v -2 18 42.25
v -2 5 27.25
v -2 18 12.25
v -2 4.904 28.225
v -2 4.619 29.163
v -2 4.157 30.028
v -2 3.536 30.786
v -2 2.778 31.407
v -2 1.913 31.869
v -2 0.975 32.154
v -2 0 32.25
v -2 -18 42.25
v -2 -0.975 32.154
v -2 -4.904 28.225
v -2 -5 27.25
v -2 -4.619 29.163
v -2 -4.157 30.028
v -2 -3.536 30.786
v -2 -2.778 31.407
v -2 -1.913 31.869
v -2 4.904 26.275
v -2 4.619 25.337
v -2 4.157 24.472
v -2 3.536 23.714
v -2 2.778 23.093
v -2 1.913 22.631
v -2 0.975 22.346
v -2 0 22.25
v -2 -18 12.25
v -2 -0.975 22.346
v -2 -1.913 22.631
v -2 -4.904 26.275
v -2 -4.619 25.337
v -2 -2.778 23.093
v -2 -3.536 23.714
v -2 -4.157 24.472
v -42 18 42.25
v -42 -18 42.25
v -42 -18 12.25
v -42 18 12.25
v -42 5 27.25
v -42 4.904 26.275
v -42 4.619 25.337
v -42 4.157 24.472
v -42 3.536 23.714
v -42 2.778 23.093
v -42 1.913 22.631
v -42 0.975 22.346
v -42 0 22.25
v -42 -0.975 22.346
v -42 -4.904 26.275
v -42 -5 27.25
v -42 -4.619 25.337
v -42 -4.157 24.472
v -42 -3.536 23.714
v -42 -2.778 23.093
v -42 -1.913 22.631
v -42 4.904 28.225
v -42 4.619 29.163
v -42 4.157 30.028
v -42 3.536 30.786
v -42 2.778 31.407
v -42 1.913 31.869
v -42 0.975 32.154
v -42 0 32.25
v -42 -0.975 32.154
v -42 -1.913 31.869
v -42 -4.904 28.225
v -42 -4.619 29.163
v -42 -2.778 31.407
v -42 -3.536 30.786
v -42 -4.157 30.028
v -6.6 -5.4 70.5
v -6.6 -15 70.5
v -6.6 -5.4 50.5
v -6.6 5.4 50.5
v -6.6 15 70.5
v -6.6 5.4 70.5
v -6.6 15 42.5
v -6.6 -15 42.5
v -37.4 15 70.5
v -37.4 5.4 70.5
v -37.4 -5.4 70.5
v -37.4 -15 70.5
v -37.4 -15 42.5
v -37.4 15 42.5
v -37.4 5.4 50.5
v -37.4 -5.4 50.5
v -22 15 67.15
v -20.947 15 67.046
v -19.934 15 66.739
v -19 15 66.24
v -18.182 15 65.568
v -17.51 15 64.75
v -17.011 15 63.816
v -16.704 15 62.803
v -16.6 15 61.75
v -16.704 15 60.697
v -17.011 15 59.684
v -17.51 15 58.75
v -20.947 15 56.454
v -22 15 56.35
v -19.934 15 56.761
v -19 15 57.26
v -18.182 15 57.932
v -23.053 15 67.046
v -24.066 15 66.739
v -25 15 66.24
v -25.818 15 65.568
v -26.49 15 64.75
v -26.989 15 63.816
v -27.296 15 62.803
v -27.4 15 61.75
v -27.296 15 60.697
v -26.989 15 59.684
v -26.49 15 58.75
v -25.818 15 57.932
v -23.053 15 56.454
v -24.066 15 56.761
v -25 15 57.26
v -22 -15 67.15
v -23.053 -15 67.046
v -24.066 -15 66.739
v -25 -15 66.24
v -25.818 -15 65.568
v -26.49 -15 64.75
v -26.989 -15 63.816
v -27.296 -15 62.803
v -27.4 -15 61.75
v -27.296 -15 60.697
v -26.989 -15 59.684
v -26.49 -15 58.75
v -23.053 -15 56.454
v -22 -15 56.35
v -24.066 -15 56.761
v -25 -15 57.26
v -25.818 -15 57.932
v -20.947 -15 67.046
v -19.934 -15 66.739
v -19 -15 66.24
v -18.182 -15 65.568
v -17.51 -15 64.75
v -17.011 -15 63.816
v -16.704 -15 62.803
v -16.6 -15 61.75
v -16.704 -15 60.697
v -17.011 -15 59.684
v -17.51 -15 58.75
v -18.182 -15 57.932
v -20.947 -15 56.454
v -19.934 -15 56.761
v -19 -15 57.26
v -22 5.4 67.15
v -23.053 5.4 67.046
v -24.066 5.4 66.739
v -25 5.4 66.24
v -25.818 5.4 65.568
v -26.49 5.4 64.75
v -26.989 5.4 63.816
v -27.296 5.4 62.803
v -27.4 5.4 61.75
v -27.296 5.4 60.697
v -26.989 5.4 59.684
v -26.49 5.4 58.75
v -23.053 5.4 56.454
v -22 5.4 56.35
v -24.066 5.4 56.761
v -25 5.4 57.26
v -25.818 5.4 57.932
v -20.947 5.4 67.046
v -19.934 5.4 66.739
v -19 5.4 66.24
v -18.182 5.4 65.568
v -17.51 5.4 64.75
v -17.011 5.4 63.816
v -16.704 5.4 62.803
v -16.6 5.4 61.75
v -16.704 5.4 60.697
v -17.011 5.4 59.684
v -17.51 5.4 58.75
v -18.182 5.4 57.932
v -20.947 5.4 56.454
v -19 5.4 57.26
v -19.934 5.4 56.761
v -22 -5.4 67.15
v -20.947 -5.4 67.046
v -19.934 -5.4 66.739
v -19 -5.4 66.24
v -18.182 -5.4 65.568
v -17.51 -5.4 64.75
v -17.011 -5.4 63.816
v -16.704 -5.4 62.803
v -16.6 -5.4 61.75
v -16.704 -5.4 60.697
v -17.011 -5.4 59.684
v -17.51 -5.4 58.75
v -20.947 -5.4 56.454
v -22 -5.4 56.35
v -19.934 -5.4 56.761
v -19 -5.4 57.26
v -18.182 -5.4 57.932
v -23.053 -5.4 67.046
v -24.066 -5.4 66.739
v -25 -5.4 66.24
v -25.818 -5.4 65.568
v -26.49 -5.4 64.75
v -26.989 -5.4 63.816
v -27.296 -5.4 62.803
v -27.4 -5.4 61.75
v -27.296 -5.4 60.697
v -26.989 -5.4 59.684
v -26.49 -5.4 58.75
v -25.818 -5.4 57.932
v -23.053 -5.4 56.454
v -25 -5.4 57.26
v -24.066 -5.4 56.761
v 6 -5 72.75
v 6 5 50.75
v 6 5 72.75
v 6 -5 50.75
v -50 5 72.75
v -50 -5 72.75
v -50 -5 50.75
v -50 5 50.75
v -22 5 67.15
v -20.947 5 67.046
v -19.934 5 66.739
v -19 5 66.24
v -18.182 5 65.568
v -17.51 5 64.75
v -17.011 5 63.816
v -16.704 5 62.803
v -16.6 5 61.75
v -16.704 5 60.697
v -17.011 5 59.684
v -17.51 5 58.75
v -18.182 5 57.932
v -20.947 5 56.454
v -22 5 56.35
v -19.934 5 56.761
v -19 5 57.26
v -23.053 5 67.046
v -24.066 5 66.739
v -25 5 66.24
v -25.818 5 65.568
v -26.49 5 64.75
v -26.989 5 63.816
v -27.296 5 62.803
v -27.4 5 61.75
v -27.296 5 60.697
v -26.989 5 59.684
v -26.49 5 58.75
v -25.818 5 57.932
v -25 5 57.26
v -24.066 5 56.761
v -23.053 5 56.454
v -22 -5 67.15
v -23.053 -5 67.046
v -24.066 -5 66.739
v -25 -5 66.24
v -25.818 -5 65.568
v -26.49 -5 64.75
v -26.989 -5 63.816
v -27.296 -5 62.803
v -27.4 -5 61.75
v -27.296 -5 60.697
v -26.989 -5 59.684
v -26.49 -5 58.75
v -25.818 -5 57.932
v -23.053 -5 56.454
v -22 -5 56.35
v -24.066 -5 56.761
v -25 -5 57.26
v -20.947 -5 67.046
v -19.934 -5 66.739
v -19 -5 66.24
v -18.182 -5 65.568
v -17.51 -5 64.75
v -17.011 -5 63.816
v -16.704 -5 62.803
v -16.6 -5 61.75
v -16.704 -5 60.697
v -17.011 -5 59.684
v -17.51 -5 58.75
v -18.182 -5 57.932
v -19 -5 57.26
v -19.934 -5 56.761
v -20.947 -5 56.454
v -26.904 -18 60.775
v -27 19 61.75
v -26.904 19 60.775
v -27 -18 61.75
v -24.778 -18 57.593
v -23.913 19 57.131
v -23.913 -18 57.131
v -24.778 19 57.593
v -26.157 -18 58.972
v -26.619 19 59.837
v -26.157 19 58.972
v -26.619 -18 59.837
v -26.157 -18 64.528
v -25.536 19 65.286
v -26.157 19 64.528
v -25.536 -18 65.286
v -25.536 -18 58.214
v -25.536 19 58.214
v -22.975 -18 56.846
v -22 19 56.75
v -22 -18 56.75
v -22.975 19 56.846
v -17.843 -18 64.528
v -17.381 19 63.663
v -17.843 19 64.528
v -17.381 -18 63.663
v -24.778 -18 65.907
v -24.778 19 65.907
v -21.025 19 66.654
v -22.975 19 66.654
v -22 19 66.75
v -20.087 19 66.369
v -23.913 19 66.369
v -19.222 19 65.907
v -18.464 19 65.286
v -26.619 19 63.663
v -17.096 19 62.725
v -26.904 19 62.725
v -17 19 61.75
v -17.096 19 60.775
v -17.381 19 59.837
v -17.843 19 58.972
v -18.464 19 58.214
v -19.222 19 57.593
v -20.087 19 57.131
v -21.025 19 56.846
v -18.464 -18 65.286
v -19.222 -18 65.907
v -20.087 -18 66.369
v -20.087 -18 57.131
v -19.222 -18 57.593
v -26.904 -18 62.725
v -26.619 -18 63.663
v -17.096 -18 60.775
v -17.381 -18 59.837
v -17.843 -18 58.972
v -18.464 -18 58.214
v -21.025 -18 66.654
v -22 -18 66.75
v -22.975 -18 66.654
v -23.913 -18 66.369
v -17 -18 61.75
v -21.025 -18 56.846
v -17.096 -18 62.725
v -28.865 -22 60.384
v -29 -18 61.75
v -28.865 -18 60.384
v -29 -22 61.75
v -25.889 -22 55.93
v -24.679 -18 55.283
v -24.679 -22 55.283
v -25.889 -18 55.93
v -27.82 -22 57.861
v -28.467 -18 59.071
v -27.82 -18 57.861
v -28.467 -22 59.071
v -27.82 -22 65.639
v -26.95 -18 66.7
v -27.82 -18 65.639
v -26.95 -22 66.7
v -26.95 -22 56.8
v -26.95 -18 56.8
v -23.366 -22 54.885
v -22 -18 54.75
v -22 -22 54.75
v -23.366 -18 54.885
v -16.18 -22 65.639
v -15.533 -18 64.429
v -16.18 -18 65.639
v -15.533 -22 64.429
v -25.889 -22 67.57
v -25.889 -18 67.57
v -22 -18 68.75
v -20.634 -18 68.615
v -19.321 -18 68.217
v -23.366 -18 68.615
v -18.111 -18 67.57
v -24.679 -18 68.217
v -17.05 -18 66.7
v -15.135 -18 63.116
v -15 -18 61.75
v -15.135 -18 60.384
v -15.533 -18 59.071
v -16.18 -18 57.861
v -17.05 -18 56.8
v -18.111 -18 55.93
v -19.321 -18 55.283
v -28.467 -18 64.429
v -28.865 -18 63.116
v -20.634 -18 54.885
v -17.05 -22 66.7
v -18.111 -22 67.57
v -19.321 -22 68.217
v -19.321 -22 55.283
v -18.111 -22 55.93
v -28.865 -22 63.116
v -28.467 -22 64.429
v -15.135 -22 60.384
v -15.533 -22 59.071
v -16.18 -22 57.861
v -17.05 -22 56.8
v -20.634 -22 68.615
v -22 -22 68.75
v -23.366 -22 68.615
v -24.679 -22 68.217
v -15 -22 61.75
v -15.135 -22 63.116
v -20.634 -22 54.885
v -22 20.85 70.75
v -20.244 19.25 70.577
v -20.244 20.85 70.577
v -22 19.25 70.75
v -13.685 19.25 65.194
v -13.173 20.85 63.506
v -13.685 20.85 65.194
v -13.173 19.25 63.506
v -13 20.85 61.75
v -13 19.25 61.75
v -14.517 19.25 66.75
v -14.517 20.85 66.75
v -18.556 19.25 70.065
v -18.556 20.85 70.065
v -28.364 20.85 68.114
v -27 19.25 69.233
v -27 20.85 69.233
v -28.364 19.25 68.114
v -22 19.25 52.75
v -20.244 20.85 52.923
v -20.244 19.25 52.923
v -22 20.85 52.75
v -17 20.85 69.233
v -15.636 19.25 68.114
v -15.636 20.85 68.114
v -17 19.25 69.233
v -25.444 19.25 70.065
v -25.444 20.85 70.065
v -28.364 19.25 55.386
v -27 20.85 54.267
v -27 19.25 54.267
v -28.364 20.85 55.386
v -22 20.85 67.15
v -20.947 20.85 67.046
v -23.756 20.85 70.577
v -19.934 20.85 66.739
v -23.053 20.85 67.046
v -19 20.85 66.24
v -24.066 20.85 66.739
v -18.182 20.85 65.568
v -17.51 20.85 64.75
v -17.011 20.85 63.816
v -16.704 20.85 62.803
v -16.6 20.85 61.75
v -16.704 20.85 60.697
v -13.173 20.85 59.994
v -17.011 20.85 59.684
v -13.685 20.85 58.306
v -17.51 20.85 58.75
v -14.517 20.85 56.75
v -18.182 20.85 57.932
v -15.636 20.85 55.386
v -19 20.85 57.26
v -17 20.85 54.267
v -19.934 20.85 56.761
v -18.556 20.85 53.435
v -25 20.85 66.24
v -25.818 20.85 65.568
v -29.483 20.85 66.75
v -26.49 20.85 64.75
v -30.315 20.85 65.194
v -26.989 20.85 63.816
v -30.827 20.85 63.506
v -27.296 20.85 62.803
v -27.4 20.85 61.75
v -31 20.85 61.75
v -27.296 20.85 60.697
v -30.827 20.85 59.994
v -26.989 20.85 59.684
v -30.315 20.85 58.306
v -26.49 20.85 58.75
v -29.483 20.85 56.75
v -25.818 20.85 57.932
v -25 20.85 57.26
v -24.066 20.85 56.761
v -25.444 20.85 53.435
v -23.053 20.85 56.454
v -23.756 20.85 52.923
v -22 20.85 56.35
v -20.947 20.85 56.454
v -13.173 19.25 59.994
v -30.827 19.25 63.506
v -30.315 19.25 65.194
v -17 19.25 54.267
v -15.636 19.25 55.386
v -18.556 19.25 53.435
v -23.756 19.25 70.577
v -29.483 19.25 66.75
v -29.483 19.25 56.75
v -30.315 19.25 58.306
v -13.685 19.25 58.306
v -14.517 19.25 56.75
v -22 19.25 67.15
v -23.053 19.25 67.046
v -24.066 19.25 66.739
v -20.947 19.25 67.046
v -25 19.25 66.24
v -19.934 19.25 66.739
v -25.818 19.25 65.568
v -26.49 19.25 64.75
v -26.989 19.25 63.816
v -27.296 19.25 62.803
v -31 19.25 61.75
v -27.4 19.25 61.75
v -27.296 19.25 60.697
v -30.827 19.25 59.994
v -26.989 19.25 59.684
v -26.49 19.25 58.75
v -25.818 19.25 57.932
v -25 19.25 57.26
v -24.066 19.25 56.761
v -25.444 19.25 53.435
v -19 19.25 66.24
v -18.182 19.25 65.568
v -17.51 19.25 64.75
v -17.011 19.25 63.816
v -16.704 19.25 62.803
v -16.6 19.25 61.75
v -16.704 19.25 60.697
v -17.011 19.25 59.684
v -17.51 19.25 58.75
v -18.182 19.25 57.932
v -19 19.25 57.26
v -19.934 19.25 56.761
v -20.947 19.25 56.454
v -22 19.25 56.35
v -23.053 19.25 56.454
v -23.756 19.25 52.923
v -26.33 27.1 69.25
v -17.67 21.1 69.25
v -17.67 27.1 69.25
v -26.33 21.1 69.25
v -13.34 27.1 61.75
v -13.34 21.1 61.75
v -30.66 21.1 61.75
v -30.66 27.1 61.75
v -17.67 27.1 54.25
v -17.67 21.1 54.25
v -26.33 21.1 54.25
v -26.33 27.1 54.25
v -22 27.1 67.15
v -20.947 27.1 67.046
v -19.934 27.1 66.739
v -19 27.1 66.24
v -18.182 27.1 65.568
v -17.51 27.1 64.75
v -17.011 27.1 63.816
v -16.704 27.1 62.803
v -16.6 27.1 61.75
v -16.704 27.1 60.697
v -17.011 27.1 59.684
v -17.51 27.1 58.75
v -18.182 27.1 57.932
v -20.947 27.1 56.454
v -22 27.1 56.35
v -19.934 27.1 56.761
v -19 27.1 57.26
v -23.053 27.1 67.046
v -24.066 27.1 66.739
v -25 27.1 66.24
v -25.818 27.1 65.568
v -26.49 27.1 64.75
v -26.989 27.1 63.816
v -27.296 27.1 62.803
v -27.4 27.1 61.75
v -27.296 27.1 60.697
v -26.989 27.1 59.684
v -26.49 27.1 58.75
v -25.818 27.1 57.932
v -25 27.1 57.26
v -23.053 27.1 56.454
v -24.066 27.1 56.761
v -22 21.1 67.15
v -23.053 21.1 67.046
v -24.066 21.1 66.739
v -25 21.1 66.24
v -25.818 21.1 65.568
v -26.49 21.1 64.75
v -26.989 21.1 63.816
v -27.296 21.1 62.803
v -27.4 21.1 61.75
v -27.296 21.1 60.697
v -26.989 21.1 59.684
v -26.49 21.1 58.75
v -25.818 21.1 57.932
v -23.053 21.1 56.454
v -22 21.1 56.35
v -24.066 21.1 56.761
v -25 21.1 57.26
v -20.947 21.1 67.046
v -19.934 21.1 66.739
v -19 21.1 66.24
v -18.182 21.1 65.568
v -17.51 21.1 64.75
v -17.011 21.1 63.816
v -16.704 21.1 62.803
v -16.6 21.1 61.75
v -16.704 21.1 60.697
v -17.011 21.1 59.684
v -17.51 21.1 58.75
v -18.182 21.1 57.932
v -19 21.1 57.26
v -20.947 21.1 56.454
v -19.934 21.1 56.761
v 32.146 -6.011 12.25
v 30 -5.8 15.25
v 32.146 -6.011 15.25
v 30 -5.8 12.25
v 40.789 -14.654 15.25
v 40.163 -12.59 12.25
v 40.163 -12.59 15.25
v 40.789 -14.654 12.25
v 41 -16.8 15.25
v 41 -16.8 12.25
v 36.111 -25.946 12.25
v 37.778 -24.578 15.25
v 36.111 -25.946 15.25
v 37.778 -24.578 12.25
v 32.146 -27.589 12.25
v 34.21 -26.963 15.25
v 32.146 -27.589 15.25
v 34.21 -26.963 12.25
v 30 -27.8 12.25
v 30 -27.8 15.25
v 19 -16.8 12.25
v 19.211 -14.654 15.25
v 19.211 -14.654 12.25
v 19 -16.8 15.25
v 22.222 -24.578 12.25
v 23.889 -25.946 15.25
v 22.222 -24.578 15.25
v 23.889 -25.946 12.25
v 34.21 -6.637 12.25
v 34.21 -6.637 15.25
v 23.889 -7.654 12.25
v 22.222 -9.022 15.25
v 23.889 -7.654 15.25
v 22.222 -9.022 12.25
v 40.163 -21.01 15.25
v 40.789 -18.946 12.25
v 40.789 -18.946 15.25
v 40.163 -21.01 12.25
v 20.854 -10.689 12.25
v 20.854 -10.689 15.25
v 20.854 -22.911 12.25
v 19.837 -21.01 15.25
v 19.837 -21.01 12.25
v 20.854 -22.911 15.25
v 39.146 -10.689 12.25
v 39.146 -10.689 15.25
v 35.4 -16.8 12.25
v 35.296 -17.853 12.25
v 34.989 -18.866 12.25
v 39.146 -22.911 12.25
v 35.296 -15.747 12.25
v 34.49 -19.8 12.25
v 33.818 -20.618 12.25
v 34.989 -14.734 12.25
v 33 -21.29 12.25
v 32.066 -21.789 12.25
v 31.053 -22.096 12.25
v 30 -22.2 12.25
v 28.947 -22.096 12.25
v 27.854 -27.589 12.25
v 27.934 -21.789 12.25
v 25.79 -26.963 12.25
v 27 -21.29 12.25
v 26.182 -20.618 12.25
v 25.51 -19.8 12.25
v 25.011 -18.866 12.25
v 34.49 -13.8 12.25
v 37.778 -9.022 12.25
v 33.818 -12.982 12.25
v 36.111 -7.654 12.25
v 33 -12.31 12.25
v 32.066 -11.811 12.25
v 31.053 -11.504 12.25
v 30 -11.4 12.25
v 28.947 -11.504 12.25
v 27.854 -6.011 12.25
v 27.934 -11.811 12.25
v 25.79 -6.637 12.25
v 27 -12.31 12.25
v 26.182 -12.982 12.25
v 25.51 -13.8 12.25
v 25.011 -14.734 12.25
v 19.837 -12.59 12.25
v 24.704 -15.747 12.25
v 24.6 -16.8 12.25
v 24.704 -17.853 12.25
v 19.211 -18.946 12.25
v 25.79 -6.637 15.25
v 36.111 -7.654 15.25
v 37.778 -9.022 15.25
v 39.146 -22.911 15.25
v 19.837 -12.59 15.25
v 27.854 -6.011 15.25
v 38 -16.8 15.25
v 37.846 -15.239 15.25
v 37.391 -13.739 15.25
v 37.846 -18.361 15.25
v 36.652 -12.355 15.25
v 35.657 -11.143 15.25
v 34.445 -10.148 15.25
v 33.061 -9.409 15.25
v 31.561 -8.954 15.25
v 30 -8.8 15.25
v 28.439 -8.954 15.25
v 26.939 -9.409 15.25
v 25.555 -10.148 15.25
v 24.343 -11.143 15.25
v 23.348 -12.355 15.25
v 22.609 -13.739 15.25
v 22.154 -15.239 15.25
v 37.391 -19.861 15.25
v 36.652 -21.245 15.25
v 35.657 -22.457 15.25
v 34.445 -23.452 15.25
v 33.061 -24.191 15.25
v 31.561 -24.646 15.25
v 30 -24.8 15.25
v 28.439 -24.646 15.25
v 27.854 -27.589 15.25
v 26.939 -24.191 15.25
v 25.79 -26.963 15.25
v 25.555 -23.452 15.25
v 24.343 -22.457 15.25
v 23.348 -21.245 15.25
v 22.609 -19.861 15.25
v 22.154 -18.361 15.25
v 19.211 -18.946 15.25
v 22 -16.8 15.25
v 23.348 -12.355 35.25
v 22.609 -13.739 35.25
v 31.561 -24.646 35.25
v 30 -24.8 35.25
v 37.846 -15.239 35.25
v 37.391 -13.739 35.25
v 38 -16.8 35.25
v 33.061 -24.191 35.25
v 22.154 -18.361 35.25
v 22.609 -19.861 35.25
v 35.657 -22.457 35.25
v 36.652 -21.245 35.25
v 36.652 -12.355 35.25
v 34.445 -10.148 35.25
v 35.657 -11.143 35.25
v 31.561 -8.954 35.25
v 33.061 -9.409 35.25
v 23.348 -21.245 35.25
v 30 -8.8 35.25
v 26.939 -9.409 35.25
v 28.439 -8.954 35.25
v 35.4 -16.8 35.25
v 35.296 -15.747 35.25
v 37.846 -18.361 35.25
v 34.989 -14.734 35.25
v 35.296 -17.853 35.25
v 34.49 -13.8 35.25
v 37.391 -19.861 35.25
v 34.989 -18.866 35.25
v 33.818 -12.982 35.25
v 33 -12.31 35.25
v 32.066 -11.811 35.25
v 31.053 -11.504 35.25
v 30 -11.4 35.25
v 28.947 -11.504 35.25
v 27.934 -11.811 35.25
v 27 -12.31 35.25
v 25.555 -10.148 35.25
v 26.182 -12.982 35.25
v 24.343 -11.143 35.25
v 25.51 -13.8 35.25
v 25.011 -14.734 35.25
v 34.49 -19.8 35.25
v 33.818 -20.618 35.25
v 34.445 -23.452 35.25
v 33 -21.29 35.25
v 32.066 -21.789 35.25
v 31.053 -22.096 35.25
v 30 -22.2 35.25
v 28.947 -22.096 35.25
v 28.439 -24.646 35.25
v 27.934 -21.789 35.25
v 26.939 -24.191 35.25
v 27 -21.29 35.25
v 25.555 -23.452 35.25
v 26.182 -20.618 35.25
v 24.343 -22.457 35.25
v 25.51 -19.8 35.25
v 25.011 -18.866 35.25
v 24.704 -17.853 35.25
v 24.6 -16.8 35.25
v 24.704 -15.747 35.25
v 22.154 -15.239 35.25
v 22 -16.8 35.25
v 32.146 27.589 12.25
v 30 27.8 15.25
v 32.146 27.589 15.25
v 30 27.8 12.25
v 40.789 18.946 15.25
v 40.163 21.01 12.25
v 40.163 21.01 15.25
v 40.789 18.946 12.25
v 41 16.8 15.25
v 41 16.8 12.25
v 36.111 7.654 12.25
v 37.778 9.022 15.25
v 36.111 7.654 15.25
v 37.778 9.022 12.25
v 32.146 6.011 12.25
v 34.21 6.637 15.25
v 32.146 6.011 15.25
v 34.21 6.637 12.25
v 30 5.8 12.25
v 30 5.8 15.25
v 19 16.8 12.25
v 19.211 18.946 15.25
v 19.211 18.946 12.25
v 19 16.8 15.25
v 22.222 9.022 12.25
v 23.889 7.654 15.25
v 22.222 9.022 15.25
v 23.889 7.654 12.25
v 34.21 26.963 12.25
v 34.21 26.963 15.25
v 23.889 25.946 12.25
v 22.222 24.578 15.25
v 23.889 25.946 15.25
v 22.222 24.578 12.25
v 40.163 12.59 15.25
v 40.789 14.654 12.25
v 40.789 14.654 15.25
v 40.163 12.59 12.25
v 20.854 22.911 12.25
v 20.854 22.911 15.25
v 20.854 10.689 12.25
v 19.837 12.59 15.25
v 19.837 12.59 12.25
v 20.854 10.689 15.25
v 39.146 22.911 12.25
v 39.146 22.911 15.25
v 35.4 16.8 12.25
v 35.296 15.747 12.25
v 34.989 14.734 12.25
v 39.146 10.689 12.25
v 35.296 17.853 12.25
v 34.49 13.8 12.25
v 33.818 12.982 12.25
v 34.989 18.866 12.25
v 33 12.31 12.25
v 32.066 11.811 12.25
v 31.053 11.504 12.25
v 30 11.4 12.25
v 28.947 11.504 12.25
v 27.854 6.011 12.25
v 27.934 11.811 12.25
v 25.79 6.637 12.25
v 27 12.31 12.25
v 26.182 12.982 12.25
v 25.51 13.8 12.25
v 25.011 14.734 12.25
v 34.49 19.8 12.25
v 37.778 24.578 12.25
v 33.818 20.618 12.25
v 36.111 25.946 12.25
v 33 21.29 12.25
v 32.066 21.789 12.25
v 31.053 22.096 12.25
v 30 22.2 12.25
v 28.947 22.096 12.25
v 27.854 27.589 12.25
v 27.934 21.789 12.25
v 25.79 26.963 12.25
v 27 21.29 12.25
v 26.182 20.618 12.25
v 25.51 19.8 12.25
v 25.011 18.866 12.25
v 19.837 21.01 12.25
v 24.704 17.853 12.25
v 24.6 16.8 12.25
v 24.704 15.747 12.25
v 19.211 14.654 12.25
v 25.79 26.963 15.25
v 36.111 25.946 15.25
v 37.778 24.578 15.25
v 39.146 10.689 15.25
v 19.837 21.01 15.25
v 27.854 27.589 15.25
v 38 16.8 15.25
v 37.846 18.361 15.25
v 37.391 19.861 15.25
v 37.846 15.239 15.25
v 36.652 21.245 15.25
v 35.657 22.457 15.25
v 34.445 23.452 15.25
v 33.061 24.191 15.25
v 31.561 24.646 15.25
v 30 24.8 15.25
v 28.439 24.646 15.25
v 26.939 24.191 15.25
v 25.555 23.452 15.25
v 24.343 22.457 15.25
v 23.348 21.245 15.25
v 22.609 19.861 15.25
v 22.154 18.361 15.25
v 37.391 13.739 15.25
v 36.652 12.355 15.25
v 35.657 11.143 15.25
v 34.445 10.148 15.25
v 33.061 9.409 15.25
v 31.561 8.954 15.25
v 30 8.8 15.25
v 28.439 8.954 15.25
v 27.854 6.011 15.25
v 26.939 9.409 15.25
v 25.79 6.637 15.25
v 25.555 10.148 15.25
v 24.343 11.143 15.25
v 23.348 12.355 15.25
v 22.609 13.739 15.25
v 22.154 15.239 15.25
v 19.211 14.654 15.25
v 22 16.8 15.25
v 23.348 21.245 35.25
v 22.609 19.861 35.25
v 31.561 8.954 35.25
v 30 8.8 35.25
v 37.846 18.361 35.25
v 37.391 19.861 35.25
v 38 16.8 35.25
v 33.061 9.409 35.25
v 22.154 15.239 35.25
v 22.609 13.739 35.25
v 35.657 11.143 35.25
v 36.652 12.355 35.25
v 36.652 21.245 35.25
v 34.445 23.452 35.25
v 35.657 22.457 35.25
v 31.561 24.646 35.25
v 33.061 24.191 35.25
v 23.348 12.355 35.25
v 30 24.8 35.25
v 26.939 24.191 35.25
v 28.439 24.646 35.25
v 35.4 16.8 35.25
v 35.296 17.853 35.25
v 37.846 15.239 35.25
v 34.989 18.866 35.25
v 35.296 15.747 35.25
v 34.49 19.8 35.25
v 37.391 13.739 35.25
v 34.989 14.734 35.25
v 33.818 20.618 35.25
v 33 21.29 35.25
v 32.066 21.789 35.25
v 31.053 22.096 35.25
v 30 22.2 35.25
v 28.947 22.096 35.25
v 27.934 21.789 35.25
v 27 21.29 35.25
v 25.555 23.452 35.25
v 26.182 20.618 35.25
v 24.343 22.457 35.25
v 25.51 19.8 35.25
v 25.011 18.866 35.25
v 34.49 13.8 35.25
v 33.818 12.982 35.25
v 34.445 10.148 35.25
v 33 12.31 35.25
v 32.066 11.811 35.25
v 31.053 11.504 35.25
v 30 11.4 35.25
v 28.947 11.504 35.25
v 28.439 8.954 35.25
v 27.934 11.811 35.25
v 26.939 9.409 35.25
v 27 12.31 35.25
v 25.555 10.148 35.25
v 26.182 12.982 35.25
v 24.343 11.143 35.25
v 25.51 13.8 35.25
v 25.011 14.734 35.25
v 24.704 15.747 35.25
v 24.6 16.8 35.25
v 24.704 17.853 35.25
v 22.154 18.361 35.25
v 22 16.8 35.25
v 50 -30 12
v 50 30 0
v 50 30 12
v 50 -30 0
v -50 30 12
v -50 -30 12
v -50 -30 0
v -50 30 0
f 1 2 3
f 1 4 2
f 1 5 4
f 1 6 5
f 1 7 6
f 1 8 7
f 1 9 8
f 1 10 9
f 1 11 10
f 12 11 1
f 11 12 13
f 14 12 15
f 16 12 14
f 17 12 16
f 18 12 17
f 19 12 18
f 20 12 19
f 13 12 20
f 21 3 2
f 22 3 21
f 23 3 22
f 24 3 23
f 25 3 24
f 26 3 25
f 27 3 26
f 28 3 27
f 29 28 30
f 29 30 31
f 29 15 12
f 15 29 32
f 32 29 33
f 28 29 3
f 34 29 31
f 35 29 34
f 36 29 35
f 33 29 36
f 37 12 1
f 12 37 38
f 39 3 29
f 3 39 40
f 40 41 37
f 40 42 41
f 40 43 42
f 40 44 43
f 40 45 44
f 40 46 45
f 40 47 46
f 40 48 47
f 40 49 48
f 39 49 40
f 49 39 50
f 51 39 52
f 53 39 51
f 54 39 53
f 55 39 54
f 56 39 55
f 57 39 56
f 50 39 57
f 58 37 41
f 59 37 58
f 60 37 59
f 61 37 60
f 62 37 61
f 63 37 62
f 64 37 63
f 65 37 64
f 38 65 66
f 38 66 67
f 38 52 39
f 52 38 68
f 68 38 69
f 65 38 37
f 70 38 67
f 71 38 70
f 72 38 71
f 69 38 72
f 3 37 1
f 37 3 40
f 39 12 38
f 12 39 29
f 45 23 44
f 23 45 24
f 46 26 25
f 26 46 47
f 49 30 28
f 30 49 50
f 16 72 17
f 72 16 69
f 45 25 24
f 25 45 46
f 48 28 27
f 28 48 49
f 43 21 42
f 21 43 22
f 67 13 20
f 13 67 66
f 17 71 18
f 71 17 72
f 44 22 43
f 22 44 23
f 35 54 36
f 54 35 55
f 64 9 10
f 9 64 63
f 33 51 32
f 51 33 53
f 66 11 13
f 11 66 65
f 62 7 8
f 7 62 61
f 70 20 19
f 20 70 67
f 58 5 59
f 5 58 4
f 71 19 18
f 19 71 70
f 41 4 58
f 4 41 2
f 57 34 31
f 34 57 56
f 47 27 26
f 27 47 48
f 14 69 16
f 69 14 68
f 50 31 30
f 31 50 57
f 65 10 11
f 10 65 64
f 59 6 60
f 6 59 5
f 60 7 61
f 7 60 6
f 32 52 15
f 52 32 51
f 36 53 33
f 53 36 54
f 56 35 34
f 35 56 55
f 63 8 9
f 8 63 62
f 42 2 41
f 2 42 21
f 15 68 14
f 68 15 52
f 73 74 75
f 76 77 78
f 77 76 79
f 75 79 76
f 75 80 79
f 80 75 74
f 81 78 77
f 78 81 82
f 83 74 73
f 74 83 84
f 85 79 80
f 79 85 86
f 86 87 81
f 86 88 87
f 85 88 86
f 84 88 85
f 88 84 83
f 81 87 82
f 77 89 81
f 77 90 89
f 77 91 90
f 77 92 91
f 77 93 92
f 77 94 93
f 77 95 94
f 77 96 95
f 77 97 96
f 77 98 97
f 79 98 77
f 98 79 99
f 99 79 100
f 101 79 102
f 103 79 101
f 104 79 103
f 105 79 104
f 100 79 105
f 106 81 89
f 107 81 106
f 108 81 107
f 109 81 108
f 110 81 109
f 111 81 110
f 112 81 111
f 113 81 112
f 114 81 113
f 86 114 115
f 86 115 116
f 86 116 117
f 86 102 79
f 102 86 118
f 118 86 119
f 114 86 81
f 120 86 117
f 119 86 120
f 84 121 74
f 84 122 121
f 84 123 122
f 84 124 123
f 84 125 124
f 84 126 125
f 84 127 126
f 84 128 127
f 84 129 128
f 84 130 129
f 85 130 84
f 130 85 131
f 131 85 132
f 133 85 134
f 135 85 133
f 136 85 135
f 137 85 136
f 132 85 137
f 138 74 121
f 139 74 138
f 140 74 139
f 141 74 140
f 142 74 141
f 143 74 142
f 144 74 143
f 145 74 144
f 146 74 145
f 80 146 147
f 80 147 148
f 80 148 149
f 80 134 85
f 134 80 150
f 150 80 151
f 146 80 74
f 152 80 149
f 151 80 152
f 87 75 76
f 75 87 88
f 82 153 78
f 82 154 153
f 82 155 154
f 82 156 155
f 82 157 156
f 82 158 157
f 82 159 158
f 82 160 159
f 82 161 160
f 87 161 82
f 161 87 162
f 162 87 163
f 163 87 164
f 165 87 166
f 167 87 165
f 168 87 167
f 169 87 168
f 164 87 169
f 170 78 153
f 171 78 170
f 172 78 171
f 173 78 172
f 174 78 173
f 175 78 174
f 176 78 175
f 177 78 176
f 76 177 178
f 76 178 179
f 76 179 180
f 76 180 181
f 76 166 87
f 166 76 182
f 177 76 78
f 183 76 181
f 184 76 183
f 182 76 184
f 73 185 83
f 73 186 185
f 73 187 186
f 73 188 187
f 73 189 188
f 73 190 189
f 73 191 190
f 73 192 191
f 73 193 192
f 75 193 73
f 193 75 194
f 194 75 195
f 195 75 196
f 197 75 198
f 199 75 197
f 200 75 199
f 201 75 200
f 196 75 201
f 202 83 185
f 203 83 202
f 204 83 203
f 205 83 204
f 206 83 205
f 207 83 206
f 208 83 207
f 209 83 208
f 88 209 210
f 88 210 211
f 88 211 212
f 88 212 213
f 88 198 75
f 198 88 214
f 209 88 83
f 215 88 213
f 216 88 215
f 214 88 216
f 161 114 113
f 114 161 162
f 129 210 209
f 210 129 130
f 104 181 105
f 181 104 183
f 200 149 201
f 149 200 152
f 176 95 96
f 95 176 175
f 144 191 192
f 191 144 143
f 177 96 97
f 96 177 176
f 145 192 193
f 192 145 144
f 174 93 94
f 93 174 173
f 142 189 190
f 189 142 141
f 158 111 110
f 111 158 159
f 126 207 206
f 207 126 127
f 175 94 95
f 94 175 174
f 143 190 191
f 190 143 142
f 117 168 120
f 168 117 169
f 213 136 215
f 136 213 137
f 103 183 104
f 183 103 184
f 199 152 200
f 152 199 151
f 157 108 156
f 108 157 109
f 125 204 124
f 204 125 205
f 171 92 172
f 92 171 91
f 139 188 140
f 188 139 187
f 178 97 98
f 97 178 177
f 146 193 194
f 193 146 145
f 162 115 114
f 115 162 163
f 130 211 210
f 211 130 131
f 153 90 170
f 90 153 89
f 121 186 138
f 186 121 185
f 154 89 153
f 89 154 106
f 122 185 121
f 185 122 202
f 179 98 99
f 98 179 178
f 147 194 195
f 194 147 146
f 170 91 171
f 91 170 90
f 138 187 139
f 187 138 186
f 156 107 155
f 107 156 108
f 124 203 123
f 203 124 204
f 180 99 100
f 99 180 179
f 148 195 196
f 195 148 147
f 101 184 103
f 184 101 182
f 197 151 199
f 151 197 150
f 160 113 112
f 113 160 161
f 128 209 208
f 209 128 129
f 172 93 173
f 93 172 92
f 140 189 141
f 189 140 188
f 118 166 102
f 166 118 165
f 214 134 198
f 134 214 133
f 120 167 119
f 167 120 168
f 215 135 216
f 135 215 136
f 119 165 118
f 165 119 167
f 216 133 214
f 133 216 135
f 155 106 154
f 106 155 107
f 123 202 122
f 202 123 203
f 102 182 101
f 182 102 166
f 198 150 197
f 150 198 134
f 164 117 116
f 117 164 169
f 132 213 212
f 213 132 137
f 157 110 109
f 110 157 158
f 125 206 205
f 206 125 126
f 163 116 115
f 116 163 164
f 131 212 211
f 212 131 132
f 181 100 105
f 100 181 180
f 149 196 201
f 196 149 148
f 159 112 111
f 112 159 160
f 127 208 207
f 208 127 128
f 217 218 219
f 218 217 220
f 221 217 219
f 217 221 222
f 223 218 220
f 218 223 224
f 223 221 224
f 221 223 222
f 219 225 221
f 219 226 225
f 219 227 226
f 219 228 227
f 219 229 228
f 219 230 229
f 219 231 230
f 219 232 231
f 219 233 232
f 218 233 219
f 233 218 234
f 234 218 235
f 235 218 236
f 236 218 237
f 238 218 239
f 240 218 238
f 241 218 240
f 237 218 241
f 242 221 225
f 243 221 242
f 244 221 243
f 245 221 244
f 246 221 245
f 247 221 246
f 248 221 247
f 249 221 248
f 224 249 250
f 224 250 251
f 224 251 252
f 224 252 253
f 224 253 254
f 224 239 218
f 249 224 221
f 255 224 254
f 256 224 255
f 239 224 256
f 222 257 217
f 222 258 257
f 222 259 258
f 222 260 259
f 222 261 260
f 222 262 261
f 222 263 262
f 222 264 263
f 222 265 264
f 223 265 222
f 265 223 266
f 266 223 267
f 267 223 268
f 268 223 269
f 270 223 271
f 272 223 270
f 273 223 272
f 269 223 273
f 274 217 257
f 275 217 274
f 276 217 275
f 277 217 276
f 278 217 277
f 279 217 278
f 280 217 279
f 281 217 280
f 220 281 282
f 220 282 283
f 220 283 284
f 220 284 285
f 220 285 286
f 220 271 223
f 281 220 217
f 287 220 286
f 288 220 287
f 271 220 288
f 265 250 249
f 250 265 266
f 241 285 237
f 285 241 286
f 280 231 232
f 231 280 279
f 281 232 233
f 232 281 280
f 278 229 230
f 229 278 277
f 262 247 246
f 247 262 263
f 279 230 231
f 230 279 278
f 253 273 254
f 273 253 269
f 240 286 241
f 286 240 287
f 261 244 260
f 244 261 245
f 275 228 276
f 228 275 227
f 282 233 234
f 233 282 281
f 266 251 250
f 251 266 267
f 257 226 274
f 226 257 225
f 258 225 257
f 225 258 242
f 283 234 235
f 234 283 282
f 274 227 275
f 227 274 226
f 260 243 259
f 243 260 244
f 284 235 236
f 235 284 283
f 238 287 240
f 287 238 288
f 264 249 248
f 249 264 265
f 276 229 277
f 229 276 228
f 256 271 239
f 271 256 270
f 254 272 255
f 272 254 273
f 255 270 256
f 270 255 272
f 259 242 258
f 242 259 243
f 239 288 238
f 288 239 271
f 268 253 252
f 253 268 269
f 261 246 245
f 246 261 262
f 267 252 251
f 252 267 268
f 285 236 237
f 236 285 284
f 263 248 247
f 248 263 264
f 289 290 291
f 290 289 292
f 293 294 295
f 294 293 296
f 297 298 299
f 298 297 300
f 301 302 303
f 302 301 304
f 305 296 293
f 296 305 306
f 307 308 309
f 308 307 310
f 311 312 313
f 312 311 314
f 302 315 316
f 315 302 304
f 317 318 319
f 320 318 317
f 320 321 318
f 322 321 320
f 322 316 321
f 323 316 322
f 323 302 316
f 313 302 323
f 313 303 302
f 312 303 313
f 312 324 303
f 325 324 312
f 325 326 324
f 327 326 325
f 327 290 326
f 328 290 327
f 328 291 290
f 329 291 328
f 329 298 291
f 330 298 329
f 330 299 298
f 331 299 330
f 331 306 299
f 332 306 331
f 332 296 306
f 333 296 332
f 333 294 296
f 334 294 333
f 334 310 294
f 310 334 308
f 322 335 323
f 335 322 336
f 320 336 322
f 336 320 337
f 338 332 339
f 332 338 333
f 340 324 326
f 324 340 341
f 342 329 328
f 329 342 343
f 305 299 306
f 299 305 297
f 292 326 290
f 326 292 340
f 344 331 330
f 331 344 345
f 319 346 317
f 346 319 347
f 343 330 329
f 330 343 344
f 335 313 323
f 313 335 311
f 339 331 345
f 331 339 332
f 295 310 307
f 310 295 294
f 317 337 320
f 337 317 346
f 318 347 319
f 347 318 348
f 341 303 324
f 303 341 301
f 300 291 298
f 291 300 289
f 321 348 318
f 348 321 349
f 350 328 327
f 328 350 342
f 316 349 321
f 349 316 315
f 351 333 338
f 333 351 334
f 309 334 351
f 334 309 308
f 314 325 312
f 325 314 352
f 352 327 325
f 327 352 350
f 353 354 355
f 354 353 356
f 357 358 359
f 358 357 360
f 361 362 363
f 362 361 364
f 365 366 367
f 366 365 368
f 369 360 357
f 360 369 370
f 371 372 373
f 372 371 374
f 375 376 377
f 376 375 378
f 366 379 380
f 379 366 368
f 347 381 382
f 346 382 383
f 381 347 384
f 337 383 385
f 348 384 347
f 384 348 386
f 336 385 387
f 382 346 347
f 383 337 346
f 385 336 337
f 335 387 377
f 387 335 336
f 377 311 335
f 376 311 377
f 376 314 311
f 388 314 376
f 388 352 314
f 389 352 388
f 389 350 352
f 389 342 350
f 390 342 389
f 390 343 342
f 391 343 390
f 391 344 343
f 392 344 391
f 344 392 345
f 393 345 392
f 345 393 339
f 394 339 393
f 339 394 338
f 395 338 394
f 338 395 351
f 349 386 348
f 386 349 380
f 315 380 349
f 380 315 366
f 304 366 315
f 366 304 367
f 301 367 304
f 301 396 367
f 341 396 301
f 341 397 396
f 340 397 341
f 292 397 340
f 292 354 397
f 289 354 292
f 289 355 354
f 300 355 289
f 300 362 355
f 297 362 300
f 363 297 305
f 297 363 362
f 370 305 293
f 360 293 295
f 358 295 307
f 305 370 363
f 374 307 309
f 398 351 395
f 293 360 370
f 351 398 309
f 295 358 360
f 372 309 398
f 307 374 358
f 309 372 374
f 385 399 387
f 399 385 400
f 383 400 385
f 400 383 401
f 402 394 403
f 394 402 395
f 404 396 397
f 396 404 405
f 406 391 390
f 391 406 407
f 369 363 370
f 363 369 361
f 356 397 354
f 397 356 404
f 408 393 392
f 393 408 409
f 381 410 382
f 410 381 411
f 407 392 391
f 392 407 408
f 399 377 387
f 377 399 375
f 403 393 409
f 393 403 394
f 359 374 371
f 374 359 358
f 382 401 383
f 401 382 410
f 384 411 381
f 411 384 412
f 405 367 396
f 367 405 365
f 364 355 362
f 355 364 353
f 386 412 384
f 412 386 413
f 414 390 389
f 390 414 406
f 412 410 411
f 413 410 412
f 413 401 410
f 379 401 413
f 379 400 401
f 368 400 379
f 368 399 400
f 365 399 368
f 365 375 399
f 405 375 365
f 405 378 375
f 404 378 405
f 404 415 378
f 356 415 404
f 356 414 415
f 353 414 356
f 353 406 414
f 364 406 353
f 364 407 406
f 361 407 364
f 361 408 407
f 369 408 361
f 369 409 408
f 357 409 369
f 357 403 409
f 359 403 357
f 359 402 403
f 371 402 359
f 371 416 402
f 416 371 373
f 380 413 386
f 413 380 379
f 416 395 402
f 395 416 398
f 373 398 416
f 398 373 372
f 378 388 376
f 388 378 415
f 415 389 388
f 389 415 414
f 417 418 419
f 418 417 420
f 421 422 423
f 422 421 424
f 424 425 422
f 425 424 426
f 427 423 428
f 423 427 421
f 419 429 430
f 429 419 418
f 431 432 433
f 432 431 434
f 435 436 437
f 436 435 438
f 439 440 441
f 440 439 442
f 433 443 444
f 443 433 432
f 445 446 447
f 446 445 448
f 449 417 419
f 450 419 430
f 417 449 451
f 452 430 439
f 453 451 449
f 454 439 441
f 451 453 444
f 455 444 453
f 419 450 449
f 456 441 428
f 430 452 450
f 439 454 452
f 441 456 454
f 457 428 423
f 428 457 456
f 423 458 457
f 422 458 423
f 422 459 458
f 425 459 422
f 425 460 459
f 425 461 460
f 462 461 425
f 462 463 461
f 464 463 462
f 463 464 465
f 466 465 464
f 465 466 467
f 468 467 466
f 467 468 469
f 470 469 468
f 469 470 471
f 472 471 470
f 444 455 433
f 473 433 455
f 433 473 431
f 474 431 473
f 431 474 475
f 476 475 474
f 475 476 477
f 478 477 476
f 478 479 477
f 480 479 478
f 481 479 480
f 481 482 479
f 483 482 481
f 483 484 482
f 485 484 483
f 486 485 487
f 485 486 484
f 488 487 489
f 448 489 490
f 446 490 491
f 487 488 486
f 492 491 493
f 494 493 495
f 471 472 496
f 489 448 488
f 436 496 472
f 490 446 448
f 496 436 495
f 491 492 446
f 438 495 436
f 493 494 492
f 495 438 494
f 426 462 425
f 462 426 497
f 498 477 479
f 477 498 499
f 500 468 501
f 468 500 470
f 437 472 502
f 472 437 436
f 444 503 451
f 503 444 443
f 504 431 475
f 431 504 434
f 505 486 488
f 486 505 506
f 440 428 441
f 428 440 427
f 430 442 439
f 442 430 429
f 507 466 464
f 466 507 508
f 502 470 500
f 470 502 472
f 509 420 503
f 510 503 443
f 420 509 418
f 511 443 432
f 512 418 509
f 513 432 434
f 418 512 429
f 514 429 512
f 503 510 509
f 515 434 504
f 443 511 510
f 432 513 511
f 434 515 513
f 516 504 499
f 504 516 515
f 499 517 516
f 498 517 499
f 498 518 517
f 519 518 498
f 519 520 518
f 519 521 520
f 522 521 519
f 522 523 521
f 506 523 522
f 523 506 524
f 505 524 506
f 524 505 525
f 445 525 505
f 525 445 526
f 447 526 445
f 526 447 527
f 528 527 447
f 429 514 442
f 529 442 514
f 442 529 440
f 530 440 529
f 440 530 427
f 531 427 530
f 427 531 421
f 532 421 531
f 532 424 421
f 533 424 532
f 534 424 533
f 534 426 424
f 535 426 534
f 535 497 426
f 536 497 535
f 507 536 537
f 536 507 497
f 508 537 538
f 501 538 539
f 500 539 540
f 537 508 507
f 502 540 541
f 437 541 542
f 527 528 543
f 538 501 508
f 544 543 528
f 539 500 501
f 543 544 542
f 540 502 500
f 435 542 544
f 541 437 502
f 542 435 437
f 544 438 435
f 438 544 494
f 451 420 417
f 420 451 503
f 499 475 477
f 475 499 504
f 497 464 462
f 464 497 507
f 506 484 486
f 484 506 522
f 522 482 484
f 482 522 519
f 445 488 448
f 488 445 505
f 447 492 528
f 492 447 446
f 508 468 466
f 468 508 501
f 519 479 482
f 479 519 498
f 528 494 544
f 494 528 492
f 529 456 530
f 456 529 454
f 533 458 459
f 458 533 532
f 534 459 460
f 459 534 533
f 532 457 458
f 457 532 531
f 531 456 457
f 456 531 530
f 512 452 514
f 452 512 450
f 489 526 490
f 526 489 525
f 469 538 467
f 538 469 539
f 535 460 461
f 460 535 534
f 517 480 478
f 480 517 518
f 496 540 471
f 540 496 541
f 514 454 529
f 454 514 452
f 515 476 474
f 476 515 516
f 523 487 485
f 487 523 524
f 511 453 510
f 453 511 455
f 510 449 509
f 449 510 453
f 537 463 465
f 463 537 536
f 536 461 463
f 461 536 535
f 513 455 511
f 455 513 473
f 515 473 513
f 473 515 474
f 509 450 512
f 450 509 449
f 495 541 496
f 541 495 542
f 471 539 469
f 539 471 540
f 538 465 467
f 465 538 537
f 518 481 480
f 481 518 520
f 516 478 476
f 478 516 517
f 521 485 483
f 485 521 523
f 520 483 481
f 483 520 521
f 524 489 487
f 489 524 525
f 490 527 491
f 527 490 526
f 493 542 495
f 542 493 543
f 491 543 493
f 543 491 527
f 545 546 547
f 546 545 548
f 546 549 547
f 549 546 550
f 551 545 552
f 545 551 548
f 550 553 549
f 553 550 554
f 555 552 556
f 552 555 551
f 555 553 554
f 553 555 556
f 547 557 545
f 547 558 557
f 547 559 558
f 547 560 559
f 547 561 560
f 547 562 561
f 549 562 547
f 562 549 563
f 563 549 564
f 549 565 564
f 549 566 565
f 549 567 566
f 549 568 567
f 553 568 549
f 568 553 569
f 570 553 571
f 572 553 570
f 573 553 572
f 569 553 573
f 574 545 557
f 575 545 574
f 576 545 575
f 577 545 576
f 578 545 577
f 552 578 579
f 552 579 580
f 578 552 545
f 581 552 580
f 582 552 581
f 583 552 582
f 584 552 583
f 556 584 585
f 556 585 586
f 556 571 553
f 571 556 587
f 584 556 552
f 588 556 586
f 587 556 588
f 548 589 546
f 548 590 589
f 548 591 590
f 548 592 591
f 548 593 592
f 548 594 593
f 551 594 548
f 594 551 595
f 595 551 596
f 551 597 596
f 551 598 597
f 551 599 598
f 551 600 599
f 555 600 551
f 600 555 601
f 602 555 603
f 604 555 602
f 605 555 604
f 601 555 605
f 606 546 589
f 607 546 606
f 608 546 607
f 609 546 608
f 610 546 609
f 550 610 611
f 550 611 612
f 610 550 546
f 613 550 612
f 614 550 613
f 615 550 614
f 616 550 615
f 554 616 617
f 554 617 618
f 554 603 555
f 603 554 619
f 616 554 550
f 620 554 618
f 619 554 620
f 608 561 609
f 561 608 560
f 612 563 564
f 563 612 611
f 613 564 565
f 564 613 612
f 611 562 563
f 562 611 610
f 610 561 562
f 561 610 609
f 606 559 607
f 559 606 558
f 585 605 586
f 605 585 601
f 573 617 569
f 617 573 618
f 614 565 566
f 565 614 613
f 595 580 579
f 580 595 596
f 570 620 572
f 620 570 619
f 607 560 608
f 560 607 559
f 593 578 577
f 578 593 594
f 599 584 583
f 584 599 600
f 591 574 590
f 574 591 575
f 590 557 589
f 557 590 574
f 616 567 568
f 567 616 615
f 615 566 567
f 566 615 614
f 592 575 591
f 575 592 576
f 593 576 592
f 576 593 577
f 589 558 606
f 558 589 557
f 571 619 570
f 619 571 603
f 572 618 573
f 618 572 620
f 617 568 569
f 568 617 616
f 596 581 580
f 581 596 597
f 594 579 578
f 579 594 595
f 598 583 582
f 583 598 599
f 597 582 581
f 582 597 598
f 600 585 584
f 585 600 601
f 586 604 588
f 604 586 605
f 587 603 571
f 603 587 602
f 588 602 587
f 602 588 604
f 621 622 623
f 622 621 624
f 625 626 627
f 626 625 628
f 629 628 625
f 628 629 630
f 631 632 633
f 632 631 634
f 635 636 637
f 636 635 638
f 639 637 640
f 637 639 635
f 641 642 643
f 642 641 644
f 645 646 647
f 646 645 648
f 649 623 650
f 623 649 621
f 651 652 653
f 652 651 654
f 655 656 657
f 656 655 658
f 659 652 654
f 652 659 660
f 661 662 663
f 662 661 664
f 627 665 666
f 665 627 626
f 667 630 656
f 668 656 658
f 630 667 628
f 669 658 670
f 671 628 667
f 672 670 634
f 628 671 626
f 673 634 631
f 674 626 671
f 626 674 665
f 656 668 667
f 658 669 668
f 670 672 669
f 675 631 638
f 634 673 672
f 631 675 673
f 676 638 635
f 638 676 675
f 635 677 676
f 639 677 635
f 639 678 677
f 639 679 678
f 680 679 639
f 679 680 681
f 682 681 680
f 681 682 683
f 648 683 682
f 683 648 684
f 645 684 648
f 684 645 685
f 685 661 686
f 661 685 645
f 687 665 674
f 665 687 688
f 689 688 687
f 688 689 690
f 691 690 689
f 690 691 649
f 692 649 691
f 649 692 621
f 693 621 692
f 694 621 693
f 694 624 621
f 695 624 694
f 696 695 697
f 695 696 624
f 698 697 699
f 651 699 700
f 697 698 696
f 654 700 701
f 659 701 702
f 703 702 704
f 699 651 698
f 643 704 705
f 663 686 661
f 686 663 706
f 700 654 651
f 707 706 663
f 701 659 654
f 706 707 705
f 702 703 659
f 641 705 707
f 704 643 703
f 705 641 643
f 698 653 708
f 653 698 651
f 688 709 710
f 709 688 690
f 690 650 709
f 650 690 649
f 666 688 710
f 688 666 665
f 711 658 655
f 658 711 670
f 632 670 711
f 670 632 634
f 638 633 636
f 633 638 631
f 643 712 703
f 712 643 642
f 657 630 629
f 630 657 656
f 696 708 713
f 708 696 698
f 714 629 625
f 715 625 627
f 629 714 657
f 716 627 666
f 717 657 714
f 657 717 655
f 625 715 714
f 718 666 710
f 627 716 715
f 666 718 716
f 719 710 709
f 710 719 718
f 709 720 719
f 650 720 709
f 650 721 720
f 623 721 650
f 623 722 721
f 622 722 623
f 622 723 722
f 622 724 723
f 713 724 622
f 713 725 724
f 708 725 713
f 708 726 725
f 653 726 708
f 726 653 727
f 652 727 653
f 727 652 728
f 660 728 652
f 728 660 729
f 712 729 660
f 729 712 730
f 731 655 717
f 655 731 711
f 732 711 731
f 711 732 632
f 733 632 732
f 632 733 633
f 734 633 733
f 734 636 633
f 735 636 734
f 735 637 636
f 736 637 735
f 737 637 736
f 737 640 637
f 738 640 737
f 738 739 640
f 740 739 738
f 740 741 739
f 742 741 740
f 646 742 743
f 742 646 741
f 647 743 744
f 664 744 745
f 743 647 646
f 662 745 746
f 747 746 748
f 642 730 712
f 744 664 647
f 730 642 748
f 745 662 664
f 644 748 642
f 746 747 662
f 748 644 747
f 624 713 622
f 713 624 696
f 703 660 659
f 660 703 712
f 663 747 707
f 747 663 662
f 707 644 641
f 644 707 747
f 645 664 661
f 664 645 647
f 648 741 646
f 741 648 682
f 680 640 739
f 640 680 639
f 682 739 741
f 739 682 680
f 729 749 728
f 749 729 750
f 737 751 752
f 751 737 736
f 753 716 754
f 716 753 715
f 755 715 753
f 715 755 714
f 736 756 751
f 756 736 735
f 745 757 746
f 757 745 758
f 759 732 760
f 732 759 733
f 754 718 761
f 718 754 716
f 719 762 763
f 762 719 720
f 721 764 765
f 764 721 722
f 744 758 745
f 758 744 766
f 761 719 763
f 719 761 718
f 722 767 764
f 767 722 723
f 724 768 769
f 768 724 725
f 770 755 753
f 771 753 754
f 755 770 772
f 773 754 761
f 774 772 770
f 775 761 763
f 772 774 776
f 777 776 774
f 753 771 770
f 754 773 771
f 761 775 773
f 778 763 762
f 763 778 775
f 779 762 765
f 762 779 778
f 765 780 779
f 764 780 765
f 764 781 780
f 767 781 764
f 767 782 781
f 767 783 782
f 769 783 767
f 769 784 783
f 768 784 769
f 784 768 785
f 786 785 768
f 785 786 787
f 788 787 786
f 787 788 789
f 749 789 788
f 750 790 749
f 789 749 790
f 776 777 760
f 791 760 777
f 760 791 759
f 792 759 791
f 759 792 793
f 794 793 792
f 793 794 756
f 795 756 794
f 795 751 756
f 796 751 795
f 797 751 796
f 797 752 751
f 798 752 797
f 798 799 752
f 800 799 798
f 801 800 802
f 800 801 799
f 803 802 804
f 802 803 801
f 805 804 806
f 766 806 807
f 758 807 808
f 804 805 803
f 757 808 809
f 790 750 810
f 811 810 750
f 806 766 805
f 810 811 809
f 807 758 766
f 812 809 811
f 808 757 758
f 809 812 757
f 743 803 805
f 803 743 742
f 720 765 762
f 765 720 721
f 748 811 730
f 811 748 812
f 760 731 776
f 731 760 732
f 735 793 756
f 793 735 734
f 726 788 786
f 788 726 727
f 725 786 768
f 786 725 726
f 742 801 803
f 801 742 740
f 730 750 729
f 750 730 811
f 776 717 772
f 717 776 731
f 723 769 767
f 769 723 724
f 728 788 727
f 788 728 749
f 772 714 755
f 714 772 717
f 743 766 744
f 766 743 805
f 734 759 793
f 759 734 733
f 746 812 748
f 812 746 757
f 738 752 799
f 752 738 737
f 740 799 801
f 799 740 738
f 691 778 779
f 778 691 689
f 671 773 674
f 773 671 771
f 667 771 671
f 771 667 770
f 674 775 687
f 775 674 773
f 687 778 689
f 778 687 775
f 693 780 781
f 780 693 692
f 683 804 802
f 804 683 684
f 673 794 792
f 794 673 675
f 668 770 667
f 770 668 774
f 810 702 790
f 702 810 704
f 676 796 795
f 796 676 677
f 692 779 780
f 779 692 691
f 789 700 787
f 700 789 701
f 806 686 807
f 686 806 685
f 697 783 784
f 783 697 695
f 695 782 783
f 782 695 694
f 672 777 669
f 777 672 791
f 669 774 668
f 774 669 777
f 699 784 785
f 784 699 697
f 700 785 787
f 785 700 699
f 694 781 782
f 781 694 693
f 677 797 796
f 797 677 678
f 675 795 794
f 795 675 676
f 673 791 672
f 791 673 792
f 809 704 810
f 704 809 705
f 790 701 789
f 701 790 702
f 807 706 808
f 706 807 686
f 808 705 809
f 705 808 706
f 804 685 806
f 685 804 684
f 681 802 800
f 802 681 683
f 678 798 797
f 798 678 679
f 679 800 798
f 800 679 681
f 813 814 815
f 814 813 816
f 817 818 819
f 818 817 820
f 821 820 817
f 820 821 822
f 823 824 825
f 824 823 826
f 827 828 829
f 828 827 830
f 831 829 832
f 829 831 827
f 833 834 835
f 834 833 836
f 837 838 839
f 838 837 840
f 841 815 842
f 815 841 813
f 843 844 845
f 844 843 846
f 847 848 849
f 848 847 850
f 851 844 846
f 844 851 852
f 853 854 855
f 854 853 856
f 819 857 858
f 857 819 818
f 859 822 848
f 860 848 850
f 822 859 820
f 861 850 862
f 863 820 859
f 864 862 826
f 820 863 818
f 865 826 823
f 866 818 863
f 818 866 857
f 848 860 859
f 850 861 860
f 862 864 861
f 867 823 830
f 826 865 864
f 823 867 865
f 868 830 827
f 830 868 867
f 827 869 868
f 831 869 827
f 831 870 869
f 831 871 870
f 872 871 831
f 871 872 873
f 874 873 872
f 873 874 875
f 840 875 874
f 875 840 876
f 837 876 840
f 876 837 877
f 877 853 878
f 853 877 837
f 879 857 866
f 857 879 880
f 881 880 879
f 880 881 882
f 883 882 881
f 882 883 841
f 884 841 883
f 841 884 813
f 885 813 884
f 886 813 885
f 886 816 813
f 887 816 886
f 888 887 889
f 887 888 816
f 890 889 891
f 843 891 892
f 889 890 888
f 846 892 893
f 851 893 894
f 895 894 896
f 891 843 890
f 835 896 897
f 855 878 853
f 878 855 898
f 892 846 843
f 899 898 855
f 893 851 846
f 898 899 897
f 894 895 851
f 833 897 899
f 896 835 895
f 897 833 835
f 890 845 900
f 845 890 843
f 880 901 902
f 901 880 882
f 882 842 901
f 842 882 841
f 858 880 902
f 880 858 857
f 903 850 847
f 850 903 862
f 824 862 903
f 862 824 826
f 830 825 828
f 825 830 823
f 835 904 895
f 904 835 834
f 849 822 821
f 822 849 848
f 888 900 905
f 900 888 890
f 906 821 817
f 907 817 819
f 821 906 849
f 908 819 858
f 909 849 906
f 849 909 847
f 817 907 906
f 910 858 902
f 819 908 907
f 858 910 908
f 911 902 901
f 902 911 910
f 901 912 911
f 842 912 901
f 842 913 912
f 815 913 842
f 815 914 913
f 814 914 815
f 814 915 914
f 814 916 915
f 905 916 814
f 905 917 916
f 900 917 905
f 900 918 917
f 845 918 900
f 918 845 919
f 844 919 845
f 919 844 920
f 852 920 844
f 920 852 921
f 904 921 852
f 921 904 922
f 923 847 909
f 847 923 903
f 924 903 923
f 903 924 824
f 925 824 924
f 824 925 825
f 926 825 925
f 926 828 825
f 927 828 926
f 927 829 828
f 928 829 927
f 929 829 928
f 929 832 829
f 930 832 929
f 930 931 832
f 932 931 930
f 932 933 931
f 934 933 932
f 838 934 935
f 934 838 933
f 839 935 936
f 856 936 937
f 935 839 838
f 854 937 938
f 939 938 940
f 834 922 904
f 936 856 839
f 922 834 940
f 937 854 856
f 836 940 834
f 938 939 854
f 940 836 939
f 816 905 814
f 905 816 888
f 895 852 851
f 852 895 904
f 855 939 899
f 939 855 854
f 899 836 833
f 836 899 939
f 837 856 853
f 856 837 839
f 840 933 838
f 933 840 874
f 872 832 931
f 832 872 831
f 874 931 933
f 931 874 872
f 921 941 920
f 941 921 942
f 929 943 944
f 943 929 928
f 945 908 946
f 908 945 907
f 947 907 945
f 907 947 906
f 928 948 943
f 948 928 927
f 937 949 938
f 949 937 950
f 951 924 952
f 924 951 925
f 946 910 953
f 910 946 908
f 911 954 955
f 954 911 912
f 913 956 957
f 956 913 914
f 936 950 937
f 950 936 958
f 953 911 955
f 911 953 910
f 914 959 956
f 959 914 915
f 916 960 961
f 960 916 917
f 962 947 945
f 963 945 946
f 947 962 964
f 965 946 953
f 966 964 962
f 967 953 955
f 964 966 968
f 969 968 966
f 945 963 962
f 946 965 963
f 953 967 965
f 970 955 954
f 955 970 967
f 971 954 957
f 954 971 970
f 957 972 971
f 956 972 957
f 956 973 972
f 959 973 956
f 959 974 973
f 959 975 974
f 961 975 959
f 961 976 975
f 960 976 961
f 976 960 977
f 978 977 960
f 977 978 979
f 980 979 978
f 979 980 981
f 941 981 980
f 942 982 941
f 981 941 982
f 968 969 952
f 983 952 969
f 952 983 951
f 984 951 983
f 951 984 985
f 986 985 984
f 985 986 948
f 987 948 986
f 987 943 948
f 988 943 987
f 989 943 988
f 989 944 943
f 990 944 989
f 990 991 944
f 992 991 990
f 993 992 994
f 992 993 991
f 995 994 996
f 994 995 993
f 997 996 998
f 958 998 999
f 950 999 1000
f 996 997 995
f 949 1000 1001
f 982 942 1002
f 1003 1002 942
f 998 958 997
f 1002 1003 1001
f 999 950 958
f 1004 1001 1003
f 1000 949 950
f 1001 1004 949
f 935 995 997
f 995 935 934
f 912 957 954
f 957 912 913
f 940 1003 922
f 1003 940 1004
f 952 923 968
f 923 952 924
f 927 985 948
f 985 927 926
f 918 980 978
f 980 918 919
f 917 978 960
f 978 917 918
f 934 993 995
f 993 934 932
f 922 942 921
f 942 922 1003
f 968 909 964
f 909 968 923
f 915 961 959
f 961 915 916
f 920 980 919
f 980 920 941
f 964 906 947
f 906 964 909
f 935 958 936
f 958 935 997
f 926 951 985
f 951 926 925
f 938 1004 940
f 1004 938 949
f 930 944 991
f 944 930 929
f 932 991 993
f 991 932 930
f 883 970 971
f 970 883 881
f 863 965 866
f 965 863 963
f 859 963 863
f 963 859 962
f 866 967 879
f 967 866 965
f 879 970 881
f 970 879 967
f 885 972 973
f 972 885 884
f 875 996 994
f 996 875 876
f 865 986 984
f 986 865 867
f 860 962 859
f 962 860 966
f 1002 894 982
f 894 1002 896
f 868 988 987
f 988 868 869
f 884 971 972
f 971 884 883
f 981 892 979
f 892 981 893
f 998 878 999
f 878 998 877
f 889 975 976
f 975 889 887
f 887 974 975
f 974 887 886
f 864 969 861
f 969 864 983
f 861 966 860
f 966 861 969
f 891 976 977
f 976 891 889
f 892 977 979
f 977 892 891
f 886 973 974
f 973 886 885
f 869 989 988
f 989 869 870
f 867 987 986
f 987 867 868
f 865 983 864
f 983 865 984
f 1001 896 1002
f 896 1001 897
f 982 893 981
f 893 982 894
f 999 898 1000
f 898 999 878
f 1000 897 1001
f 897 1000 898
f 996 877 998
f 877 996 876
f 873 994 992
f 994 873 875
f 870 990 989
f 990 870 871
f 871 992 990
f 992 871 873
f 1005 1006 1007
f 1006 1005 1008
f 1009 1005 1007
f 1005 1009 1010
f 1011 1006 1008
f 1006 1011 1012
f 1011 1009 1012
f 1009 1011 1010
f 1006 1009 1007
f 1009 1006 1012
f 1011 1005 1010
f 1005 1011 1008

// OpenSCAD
$fn = 32;

// ------------------------------------------------------------------------
// Indexing jig: plate 100 x 60 mm, pin d10
// Every part is its own module, assembly() places every instance.
// ------------------------------------------------------------------------

// --- part 1 ---
module jig_plate() {
  difference() {
    translate([-50, -30, 0]) cube([100, 60, 12]);
  }
}

// --- part 2 ---
module locator_block() {
  difference() {
    translate([-20, -18, 0]) cube([40, 36, 30]);
    translate([0, 0, 15]) rotate([0, 90, 0]) cylinder(h = 42, d = 10, center = true);
  }
}

// --- part 3 ---
module index_fork() {
  difference() {
    translate([-15.4, -15, 0]) cube([30.8, 30, 28]);
    translate([-16.4, -5.4, 8]) cube([32.8, 10.8, 21]);
    translate([0, 0, 19.25]) rotate([90, 0, 0]) cylinder(h = 32, d = 10.8, center = true);
  }
}

// --- part 4 ---
module index_arm() {
  difference() {
    translate([-28, -5, 0]) cube([56, 10, 22]);
    translate([0, 0, 11]) rotate([90, 0, 0]) cylinder(h = 12, d = 10.8, center = true);
  }
}

// --- part 5 ---
module index_pin() {
  rotate([0, 90, 0]) cylinder(h = 38, d = 10, center = true);
  translate([-22, 0, 0]) rotate([0, 90, 0]) cylinder(h = 4, d = 14);
}

// --- part 6 ---
module pin_washer() {
  difference() {
      translate([0, 0, 0]) cylinder(h = 1.6, d = 18);
      translate([0, 0, -1]) cylinder(h = 3.6, d = 10.8);
    }
}

// --- part 7 ---
module lock_nut() {
  difference() {
    linear_extrude(height = 6) polygon(points = [[8.66, 0], [4.33, 7.5], [-4.33, 7.5], [-8.66, 0], [-4.33, -7.5], [4.33, -7.5]]);
    translate([0, 0, -1]) cylinder(h = 8, d = 10.8);
  }
}

// --- part 8 ---
module guide_bush_a() {
  difference() {
    union() {
      cylinder(h = 3, d = 22);
      translate([0, 0, 3]) cylinder(h = 20, d = 16);
    }
    translate([0, 0, -1]) cylinder(h = 25, d = 10.8);
  }
}

// --- part 9 ---
module guide_bush_b() {
  difference() {
    union() {
      cylinder(h = 3, d = 22);
      translate([0, 0, 3]) cylinder(h = 20, d = 16);
    }
    translate([0, 0, -1]) cylinder(h = 25, d = 10.8);
  }
}

// --- assembly ---
module assembly() {
  color([0.80, 0.24, 0.20]) translate([0, 0, 0]) rotate([0, 0, 0]) jig_plate();
  color([0.20, 0.45, 0.75]) translate([-22, 0, 12.25]) rotate([0, 0, 0]) locator_block();
  color([0.25, 0.62, 0.32]) translate([-22, 0, 42.5]) rotate([0, 0, 0]) index_fork();
  color([0.92, 0.70, 0.18]) translate([-22, 0, 50.75]) rotate([0, 0, 0]) index_arm();
  color([0.58, 0.35, 0.70]) translate([-22, 0, 61.75]) rotate([0, 0, 90]) index_pin();
  color([0.16, 0.66, 0.66]) translate([-22, 20.85, 61.75]) rotate([90, 0, 0]) pin_washer();
  color([0.85, 0.48, 0.18]) translate([-22, 27.1, 61.75]) rotate([90, 0, 0]) lock_nut();
  color([0.55, 0.60, 0.65]) translate([30, -16.8, 12.25]) rotate([0, 0, 0]) guide_bush_a();
  color([0.75, 0.30, 0.55]) translate([30, 16.8, 12.25]) rotate([0, 0, 0]) guide_bush_b();
}

assembly();
